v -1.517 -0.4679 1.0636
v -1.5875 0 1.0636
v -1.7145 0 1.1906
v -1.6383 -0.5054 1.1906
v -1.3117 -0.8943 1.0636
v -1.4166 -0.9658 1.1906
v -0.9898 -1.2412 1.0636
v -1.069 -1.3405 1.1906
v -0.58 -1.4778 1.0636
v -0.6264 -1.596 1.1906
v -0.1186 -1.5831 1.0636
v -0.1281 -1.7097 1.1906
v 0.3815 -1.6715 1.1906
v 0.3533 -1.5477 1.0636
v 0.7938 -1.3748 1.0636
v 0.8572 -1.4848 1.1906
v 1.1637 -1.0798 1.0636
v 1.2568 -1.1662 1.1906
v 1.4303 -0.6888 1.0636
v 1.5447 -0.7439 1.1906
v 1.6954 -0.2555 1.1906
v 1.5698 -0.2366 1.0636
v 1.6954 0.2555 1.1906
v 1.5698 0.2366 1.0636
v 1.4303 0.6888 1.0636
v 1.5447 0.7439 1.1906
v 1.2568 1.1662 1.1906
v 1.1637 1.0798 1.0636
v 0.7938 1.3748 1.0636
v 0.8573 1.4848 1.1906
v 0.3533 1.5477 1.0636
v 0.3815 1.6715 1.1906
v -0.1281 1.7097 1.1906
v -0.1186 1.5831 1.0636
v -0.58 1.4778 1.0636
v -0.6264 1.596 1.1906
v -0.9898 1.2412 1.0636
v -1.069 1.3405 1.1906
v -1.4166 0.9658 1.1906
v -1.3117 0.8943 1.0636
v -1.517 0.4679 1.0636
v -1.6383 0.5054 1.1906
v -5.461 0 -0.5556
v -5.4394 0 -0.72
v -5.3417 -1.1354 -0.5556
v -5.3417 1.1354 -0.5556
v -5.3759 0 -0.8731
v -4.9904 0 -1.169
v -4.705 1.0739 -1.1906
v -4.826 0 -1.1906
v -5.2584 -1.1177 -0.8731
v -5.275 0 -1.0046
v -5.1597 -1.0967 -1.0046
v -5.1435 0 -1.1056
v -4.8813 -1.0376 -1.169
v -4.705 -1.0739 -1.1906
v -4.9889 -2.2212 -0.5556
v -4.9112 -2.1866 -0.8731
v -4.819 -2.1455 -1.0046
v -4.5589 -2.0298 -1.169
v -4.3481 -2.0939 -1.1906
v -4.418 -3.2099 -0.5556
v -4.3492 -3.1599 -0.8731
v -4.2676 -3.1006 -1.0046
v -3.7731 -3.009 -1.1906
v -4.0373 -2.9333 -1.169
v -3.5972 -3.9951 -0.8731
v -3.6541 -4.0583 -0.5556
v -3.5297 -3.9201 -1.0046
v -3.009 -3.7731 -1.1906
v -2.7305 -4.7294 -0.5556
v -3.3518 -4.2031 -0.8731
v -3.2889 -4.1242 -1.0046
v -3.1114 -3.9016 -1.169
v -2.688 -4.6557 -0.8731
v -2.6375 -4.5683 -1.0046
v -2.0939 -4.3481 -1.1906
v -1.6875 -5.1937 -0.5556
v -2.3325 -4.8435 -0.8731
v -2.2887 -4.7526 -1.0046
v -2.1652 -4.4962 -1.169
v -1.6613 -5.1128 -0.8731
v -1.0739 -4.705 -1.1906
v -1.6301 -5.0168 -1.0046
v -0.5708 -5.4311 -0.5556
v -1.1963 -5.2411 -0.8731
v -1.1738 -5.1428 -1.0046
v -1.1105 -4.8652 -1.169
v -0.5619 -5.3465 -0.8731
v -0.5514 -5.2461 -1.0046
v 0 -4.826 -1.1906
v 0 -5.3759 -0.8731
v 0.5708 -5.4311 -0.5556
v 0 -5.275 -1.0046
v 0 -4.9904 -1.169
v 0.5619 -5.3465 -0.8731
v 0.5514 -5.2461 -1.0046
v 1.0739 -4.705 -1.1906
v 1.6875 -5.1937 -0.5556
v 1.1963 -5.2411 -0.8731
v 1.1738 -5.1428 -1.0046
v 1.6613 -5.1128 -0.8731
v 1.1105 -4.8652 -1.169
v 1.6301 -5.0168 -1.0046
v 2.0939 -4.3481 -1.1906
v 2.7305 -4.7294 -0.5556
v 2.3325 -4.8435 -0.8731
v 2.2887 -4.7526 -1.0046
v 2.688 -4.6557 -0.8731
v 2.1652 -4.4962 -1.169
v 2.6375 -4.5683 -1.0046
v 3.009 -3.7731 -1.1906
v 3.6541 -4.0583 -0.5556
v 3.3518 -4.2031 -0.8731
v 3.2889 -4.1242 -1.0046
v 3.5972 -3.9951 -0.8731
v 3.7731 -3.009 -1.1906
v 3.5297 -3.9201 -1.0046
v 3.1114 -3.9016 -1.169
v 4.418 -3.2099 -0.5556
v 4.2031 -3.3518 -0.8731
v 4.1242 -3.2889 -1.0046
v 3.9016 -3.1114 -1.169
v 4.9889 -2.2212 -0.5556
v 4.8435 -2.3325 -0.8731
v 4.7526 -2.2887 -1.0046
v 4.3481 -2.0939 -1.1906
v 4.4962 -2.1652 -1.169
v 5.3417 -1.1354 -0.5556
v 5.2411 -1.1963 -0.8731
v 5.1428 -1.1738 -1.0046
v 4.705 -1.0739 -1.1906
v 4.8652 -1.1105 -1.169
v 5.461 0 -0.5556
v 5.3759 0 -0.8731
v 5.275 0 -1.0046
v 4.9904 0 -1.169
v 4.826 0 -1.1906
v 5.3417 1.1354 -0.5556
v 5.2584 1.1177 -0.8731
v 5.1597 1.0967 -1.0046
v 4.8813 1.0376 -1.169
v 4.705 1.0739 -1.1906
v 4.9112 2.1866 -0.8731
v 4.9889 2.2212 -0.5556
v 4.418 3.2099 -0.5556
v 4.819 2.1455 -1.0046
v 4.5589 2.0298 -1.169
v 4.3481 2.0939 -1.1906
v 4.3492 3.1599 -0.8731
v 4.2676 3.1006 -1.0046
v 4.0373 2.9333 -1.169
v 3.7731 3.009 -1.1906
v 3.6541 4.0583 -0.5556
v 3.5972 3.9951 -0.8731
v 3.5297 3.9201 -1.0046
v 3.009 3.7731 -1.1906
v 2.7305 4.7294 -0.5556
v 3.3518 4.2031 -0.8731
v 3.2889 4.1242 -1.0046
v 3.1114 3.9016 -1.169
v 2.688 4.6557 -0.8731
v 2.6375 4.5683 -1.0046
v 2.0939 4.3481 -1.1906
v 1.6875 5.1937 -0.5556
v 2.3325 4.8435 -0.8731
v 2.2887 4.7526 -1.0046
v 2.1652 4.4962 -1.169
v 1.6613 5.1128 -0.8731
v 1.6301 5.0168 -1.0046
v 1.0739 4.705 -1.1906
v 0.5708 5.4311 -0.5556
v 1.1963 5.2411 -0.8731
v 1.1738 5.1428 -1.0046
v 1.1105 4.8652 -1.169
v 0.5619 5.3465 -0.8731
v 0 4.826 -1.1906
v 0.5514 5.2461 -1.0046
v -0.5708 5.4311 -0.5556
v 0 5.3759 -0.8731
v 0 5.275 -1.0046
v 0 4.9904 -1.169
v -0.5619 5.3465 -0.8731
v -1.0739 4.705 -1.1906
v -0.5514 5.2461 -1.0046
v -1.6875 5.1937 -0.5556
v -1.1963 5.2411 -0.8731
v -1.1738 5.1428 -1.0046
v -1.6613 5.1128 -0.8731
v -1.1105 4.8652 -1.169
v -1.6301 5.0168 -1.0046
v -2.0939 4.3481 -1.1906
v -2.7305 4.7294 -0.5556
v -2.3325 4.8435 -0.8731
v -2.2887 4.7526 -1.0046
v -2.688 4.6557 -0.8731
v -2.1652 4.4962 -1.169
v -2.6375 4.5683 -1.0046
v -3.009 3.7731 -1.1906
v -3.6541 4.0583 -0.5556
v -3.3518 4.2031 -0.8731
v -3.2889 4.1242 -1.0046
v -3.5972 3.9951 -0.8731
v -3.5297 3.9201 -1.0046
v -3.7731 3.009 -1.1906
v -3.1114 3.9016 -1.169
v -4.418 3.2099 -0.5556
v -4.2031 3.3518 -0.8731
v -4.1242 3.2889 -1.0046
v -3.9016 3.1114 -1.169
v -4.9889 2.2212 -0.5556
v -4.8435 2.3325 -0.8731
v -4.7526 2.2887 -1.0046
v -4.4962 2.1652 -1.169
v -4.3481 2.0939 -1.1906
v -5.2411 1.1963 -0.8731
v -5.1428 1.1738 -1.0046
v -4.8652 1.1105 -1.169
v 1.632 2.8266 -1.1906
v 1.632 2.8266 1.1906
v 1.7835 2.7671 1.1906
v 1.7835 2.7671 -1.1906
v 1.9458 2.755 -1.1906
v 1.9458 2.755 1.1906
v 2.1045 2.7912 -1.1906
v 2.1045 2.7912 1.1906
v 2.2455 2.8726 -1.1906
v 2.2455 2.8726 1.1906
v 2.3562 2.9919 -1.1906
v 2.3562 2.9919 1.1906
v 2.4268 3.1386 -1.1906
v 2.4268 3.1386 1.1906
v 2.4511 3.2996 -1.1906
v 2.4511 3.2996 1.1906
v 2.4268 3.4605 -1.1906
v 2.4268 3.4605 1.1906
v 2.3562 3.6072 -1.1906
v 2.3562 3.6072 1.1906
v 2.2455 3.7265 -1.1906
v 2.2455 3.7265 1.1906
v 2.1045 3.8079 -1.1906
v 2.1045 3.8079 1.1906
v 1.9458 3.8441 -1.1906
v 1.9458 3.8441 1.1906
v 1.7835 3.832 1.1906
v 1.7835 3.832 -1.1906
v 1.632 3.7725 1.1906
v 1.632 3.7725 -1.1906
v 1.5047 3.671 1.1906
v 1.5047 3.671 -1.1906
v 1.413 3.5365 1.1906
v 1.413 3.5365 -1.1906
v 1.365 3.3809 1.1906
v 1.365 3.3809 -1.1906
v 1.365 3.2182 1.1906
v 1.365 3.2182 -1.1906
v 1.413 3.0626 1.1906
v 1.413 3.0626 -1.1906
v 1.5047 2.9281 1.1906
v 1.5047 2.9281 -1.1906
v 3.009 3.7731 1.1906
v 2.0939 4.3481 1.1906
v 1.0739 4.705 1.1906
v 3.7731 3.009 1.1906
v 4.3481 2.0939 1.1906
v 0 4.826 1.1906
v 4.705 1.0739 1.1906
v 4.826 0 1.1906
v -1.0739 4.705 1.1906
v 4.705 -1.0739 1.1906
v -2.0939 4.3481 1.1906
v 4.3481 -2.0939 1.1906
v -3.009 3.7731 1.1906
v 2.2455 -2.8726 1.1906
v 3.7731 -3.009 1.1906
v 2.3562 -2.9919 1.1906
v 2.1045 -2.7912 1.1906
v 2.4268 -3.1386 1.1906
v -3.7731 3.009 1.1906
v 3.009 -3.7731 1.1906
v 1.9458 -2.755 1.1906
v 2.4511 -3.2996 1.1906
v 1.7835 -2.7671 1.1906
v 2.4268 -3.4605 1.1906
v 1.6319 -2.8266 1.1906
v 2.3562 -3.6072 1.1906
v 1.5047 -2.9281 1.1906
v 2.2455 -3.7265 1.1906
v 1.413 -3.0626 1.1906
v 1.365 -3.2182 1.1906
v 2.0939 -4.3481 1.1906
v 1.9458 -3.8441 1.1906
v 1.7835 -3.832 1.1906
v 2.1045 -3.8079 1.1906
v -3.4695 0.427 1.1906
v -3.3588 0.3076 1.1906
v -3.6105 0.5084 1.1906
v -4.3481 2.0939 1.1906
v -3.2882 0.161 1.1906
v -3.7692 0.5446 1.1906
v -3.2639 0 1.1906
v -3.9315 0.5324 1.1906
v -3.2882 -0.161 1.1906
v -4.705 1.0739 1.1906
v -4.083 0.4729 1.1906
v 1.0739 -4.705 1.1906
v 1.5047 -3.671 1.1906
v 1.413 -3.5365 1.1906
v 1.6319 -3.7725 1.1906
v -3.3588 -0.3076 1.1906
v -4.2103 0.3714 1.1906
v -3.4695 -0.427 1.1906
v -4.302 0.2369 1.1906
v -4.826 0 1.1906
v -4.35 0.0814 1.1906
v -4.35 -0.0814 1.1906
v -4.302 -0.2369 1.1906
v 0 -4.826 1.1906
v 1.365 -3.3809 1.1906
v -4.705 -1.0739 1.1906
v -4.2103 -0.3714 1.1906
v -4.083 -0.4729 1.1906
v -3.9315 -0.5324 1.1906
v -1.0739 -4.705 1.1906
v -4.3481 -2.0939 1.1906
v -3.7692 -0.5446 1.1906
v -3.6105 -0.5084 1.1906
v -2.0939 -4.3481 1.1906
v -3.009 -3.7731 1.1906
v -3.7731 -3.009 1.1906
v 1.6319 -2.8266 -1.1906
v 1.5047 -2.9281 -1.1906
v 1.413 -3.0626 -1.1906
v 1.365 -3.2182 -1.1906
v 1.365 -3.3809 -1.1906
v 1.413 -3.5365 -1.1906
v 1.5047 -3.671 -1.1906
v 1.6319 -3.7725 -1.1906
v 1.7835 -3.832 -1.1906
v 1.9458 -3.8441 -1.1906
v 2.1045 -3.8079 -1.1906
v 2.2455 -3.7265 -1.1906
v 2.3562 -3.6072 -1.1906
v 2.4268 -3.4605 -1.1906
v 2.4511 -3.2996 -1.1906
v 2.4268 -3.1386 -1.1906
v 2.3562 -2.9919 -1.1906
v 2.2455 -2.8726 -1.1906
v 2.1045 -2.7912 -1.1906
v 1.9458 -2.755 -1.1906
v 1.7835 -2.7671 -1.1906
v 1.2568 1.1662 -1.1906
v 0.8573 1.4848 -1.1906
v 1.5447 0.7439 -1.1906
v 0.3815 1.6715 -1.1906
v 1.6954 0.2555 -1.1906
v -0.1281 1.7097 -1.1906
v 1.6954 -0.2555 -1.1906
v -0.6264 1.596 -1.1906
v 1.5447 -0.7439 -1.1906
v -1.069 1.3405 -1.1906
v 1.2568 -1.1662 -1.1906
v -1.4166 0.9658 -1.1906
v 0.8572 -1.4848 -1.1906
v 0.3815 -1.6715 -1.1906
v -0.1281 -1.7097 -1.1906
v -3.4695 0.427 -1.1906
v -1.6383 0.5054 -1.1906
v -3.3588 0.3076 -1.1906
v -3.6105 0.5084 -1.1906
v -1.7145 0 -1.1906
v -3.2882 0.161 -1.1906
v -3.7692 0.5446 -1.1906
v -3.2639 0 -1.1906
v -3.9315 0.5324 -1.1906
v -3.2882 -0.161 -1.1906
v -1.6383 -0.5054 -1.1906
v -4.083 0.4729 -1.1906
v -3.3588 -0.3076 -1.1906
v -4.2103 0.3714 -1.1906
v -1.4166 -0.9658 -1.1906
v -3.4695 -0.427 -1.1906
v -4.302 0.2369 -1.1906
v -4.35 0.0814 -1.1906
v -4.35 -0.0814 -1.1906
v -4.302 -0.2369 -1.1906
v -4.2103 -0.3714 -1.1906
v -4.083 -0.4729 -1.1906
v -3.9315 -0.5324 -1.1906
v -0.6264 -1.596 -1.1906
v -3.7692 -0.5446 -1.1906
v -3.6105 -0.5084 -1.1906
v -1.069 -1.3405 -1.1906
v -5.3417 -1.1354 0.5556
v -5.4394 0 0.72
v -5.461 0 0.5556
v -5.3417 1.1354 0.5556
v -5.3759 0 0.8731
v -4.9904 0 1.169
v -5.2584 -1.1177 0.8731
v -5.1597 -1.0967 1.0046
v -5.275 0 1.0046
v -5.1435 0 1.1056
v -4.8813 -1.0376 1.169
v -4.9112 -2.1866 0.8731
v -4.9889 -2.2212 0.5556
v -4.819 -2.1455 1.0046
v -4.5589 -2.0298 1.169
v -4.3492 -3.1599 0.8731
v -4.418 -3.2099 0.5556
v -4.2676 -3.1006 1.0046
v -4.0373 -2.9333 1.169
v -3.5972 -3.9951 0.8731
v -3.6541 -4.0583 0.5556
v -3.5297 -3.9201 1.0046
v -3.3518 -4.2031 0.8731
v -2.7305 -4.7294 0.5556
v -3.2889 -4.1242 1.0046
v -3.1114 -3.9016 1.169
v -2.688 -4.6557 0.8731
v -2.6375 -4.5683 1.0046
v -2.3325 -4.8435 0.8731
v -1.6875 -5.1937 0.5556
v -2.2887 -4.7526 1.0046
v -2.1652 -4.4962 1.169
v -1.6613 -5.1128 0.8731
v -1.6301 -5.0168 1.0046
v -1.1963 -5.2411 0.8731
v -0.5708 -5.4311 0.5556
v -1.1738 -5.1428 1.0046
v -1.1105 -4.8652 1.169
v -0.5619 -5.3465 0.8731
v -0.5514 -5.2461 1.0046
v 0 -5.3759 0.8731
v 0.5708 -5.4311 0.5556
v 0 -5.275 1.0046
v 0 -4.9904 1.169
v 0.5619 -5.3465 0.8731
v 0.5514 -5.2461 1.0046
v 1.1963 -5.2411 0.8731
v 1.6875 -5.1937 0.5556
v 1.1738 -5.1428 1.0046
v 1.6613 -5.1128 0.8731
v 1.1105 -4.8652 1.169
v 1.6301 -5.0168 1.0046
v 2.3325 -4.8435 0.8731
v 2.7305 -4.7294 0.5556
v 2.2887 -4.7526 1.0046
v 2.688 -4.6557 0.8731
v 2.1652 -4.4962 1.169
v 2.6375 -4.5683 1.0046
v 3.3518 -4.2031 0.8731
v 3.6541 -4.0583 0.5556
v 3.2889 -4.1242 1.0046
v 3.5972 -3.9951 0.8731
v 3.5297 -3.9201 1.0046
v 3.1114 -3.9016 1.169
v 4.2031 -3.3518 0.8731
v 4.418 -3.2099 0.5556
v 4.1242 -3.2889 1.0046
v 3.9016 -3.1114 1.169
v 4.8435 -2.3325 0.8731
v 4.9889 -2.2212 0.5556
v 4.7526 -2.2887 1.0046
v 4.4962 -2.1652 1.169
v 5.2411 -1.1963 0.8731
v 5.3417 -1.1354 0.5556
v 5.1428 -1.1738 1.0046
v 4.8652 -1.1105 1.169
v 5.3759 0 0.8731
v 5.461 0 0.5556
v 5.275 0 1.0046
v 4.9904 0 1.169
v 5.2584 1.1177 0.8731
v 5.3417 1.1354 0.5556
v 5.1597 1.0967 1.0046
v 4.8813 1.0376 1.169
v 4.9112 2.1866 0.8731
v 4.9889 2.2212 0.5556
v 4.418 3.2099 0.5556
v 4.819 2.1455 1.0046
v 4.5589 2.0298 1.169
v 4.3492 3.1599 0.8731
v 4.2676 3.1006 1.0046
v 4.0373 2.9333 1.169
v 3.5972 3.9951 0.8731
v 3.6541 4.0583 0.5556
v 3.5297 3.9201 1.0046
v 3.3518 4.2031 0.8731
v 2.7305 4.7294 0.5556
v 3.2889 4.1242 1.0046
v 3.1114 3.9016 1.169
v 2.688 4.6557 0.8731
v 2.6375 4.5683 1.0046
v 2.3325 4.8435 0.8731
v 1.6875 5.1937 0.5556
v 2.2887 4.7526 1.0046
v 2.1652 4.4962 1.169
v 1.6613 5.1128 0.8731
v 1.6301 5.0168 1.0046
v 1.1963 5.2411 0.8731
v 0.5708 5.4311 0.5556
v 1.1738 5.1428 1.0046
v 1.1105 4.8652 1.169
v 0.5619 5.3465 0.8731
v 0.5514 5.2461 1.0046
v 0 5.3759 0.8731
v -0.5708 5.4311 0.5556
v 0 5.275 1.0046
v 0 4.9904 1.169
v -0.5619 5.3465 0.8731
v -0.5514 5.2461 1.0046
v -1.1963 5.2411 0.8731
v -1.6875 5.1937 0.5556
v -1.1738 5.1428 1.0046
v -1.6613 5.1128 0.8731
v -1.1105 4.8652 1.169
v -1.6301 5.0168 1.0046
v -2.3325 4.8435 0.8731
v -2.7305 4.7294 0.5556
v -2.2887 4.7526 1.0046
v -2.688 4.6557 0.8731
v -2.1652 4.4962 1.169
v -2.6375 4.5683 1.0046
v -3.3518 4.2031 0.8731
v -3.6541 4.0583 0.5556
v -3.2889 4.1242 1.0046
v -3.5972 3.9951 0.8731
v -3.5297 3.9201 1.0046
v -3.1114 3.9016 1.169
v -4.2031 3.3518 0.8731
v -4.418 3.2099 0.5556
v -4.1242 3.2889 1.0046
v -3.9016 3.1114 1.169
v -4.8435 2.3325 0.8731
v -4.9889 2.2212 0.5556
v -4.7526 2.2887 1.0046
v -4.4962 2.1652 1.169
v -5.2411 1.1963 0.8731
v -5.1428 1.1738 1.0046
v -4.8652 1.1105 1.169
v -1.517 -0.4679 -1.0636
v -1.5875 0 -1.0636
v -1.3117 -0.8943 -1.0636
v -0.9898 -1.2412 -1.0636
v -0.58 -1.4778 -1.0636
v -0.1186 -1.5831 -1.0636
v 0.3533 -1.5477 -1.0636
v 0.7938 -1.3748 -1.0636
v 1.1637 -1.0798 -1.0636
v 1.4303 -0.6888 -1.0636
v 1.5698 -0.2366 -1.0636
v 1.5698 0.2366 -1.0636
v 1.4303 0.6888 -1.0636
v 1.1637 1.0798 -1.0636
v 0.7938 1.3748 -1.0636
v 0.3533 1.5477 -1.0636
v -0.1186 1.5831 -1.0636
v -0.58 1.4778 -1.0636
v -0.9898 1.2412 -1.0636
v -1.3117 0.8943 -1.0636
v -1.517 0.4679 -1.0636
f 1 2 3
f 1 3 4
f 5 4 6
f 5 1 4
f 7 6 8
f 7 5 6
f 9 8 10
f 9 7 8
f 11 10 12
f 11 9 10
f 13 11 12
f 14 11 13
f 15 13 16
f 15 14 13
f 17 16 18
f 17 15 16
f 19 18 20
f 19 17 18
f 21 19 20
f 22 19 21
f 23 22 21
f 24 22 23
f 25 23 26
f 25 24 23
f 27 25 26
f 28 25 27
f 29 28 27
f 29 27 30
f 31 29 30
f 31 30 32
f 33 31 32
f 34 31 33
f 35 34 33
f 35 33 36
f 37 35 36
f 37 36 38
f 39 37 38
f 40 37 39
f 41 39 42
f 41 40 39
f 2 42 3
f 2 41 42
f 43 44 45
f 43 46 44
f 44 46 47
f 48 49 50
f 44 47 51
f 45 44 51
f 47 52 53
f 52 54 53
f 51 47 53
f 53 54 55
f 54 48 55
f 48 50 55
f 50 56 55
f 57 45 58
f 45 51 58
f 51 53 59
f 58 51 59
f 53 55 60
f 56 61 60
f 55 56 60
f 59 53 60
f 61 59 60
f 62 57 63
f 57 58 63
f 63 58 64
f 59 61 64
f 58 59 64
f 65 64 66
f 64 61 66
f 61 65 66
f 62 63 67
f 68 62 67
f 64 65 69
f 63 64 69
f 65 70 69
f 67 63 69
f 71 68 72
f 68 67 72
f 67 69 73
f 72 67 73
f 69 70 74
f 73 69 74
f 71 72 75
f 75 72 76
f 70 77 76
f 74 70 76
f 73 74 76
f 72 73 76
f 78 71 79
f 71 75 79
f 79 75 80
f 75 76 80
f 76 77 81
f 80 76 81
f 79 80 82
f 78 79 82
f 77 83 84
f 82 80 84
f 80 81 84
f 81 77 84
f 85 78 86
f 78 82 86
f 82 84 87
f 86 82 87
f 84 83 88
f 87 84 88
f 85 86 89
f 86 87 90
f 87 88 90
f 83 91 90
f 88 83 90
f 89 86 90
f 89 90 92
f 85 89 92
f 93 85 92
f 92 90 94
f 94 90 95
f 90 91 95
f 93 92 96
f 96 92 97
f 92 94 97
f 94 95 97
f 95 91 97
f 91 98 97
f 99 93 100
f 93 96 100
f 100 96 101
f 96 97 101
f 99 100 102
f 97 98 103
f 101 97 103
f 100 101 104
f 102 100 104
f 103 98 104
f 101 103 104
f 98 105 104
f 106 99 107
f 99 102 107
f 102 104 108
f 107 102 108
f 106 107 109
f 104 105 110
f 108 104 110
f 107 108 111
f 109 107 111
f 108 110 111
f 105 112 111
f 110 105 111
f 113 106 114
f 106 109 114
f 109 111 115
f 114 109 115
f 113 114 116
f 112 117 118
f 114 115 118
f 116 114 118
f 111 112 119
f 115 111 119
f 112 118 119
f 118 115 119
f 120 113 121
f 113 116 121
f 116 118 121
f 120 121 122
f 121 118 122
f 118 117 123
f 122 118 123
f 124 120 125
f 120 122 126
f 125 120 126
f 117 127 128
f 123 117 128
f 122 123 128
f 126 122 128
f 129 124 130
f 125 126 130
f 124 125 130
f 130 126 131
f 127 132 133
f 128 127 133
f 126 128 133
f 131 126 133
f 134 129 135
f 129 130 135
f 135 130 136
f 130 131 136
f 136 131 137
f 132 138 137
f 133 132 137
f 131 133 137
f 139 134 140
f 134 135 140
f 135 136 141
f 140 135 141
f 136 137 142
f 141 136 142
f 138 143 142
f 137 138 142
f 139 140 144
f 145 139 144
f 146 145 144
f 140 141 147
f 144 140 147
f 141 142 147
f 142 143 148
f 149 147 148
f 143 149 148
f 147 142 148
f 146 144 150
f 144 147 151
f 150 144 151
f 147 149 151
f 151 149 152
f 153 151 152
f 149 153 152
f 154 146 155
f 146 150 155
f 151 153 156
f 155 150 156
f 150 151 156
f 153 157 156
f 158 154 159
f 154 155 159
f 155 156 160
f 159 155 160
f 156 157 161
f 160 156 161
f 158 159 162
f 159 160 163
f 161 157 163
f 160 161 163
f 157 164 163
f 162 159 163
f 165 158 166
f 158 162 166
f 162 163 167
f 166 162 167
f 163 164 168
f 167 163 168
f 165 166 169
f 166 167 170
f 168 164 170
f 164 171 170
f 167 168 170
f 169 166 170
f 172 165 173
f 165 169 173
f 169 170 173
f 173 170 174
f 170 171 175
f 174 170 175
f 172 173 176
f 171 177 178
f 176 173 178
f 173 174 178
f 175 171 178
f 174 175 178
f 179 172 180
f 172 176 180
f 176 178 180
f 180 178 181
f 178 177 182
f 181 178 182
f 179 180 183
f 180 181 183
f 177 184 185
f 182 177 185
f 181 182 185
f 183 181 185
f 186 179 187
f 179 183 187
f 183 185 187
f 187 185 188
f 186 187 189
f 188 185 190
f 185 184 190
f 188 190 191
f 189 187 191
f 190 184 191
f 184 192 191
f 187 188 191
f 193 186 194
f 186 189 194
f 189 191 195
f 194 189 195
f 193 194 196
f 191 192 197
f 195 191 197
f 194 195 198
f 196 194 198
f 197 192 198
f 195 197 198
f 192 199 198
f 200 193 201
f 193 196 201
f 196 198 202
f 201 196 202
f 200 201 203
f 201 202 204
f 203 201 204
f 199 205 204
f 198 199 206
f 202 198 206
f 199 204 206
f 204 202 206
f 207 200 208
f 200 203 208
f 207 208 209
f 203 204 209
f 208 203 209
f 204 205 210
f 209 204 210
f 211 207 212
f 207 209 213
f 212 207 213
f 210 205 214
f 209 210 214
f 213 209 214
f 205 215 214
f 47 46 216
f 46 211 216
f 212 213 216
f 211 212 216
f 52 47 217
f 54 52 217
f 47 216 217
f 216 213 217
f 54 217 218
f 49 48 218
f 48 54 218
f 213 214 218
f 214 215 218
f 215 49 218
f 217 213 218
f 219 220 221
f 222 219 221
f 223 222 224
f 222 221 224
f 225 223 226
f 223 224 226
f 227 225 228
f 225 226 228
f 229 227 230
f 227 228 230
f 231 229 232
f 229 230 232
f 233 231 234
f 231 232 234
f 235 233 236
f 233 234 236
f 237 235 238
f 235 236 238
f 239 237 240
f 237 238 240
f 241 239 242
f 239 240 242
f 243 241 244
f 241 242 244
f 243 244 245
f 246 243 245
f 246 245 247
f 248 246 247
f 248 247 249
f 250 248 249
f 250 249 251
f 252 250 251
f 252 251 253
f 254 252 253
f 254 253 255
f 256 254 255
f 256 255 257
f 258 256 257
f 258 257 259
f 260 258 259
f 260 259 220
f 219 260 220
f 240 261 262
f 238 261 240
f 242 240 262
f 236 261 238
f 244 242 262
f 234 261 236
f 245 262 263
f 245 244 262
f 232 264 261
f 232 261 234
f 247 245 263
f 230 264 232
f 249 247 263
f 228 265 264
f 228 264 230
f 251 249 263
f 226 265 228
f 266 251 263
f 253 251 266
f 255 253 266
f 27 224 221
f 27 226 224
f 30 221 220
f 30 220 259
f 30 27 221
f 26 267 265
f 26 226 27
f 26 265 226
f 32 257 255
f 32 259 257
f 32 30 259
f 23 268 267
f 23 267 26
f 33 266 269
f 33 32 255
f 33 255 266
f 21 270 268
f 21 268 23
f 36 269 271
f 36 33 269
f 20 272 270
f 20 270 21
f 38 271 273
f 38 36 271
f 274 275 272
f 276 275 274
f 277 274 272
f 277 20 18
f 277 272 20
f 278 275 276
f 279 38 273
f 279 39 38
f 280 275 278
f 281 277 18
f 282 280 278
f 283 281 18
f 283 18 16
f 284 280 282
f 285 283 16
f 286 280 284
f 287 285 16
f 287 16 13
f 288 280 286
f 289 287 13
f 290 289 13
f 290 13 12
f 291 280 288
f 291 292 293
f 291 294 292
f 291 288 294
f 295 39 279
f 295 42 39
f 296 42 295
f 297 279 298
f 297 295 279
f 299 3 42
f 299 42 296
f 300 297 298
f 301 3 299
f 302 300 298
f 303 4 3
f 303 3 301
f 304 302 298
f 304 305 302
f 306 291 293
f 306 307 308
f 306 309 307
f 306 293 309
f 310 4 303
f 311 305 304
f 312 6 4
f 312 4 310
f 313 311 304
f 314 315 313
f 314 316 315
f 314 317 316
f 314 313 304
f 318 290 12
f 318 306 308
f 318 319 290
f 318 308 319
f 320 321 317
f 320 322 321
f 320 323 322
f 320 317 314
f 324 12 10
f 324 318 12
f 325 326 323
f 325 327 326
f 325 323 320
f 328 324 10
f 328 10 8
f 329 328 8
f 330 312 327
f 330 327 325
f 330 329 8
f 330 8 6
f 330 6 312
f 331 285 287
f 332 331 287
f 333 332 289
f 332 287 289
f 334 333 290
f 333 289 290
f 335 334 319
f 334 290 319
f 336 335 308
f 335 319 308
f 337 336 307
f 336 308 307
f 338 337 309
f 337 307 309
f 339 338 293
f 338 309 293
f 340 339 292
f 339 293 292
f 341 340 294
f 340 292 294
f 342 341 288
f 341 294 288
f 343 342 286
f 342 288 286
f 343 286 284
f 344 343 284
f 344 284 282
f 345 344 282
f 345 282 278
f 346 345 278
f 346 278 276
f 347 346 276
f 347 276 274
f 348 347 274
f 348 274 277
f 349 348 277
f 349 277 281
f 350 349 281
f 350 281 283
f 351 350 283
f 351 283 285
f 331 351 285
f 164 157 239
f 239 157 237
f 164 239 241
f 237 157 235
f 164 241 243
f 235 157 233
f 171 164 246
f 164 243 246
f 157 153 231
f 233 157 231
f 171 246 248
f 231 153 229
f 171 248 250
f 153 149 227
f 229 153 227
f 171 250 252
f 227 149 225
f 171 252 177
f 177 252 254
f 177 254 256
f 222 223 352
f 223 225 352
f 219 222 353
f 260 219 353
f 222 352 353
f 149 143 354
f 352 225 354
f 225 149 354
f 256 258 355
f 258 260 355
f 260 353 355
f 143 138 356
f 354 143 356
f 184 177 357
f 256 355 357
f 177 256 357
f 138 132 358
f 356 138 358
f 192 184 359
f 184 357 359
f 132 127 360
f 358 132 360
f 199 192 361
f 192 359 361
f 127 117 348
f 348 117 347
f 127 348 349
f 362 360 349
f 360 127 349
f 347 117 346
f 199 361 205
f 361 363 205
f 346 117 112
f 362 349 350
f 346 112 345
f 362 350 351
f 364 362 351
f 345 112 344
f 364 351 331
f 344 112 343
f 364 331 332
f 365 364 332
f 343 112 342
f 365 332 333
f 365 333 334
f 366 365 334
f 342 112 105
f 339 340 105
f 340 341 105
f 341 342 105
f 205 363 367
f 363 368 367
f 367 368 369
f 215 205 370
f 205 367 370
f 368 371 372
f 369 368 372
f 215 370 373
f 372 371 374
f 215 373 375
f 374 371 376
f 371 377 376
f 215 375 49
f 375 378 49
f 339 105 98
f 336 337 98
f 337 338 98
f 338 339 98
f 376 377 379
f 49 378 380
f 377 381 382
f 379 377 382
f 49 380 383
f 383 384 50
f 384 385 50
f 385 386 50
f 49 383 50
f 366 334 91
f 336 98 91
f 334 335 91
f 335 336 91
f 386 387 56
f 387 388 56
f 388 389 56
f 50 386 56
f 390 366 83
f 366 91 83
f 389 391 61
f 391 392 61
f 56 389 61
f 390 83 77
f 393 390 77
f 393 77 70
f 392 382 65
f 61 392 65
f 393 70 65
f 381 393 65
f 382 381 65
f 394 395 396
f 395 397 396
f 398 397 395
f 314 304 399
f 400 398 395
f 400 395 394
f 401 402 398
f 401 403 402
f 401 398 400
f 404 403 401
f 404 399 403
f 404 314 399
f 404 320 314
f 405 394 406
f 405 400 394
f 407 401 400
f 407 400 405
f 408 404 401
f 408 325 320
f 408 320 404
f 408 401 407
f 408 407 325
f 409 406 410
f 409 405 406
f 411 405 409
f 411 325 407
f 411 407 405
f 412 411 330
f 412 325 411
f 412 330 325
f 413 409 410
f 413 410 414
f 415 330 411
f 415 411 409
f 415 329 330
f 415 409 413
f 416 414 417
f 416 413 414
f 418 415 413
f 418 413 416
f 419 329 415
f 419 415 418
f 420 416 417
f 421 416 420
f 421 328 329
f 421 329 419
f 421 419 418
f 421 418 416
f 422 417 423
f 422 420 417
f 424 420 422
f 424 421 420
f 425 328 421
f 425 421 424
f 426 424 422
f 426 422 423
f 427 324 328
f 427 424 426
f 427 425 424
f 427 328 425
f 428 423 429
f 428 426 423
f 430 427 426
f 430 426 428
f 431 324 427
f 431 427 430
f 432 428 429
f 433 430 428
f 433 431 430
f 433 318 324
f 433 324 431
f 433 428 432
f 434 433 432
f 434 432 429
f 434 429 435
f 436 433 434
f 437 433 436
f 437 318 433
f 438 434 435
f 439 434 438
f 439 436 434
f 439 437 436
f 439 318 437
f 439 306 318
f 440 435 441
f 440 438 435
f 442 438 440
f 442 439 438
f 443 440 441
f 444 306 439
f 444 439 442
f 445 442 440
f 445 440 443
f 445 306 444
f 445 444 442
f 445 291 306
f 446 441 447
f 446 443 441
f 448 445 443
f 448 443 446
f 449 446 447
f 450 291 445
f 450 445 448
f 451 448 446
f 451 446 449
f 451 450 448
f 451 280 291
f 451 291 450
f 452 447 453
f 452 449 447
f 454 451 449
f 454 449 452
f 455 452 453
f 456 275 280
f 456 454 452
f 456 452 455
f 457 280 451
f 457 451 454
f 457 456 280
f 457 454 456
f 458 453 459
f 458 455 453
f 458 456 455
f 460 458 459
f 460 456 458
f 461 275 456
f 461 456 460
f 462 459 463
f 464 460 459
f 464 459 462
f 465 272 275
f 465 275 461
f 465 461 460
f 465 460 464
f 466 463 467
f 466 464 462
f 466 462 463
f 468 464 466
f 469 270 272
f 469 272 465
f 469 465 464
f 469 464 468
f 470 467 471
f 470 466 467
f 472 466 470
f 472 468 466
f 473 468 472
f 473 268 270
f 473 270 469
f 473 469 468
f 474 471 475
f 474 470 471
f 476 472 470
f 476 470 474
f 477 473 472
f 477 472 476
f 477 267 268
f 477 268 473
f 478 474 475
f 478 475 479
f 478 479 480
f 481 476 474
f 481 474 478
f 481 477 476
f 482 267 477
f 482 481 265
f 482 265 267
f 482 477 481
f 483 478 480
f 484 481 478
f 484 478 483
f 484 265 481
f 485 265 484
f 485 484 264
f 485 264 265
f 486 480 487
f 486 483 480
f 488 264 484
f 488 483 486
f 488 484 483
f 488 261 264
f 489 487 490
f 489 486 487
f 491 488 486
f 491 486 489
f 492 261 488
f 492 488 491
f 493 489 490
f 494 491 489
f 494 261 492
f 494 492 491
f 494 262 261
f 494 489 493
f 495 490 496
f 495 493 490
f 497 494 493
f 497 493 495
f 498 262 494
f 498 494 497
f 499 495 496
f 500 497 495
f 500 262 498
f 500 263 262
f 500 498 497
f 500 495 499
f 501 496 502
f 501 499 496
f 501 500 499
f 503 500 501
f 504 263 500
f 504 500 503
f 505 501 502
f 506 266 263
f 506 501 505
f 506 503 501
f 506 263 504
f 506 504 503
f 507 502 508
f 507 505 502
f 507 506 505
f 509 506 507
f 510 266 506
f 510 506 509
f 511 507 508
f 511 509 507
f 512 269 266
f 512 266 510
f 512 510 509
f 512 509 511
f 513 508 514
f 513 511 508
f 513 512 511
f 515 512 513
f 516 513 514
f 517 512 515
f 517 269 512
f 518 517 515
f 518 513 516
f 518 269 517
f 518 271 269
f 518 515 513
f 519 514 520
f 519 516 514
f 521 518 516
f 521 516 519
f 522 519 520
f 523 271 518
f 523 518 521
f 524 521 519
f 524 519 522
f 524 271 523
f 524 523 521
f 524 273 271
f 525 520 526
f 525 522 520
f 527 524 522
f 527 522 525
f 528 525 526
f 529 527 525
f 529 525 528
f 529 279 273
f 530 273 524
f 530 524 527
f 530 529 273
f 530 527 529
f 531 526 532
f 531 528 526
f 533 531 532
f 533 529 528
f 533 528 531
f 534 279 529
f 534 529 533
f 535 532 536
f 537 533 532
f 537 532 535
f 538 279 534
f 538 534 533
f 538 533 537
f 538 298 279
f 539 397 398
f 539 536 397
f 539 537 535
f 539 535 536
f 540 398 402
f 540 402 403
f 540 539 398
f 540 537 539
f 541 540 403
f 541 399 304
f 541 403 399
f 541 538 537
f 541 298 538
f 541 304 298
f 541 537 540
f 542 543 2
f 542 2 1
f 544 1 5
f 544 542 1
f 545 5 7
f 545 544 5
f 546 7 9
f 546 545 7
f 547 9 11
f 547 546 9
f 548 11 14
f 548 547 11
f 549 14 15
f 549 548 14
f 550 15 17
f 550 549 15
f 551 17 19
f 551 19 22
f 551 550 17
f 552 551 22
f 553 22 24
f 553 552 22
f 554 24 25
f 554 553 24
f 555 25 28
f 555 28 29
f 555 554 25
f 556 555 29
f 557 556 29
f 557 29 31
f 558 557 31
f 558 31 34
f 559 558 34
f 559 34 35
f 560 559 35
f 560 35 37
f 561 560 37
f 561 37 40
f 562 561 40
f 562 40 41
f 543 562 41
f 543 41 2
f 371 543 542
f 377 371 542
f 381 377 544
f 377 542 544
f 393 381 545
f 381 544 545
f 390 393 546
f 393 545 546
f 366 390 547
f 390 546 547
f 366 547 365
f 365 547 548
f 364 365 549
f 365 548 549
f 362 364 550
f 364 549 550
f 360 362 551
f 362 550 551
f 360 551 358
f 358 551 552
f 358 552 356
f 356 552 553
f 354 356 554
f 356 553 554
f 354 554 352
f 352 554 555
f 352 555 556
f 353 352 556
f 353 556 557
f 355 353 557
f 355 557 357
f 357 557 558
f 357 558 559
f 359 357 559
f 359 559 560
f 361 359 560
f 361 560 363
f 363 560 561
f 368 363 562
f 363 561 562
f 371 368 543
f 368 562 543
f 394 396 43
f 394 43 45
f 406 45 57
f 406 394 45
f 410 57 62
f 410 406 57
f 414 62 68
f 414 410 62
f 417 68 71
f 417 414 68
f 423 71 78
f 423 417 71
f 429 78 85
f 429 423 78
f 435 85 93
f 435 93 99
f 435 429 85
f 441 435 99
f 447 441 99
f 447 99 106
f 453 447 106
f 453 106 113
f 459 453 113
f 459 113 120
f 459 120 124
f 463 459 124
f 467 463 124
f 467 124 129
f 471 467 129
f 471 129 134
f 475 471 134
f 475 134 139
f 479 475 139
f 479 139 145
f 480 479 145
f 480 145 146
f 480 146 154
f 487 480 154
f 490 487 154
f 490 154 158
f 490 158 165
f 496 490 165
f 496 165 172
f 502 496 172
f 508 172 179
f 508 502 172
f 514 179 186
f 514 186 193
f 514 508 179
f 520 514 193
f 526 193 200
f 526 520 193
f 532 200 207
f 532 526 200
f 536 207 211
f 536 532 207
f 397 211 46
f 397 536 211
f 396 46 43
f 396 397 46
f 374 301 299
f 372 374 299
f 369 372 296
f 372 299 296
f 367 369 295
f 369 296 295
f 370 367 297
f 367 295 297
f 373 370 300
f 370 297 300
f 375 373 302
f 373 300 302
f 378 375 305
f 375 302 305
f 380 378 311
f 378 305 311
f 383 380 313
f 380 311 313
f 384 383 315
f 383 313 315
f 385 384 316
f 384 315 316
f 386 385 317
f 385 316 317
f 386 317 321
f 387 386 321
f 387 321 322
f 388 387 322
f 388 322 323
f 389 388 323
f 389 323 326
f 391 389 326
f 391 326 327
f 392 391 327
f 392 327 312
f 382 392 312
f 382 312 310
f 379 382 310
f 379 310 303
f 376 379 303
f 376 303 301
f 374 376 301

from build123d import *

# Parameters (mm, degrees)
SKETCH1_R           = 5.461
SKETCH1_R_2         = 1.5875
BOSS_EXTRUDE1_DEPTH = 1.190625
FILLET1_R           = 0.635
CHAMFER1_SIZE       = 0.127
SKETCH2_R           = 0.5461
CUT_EXTRUDE1_DEPTH  = 9.081794025
CIRPATTERN1_COUNT   = 3


with BuildPart() as part:
    # Sketch1 → Boss-Extrude1 (new, symmetric)
    with BuildSketch(Plane.XY):
        with Locations(Location((0, 0, 0), (0, 0, 180))):
            Circle(SKETCH1_R)
        with Locations(Location((0, 0, 0), (0, 0, 180))):
            Circle(SKETCH1_R_2, mode=Mode.SUBTRACT)
    extrude(amount=BOSS_EXTRUDE1_DEPTH, both=True)

    # Fillet1
    fillet1_edges = [part.edges().sort_by_distance(p)[0] for p in [
        (5.461, 0, -1.190625),
        (5.461, 0, 1.190625),
    ]]
    fillet(fillet1_edges, radius=FILLET1_R)

    # Chamfer1
    chamfer1_edges = [part.edges().sort_by_distance(p)[0] for p in [
        (1.5875, 0, -1.190625),
        (1.5875, 0, 1.190625),
    ]]
    chamfer(chamfer1_edges, length=CHAMFER1_SIZE)

    # Sketch2 → Cut-Extrude1 (cut, through all)
    with BuildSketch(Plane.XY.offset(1.190625)):
        with Locations((-3.81, 0)):
            Circle(SKETCH2_R)
    cut_extrude1 = extrude(amount=-CUT_EXTRUDE1_DEPTH, mode=Mode.SUBTRACT)

    # CirPattern1: Cut-Extrude1 ×3 about axis
    cirpattern1_axis = Axis((0, 0, 0), (0, 0, 1))
    for i in range(1, CIRPATTERN1_COUNT):
        add(cut_extrude1.rotate(cirpattern1_axis, i * 360 / CIRPATTERN1_COUNT), mode=Mode.SUBTRACT)


solid = part.part
